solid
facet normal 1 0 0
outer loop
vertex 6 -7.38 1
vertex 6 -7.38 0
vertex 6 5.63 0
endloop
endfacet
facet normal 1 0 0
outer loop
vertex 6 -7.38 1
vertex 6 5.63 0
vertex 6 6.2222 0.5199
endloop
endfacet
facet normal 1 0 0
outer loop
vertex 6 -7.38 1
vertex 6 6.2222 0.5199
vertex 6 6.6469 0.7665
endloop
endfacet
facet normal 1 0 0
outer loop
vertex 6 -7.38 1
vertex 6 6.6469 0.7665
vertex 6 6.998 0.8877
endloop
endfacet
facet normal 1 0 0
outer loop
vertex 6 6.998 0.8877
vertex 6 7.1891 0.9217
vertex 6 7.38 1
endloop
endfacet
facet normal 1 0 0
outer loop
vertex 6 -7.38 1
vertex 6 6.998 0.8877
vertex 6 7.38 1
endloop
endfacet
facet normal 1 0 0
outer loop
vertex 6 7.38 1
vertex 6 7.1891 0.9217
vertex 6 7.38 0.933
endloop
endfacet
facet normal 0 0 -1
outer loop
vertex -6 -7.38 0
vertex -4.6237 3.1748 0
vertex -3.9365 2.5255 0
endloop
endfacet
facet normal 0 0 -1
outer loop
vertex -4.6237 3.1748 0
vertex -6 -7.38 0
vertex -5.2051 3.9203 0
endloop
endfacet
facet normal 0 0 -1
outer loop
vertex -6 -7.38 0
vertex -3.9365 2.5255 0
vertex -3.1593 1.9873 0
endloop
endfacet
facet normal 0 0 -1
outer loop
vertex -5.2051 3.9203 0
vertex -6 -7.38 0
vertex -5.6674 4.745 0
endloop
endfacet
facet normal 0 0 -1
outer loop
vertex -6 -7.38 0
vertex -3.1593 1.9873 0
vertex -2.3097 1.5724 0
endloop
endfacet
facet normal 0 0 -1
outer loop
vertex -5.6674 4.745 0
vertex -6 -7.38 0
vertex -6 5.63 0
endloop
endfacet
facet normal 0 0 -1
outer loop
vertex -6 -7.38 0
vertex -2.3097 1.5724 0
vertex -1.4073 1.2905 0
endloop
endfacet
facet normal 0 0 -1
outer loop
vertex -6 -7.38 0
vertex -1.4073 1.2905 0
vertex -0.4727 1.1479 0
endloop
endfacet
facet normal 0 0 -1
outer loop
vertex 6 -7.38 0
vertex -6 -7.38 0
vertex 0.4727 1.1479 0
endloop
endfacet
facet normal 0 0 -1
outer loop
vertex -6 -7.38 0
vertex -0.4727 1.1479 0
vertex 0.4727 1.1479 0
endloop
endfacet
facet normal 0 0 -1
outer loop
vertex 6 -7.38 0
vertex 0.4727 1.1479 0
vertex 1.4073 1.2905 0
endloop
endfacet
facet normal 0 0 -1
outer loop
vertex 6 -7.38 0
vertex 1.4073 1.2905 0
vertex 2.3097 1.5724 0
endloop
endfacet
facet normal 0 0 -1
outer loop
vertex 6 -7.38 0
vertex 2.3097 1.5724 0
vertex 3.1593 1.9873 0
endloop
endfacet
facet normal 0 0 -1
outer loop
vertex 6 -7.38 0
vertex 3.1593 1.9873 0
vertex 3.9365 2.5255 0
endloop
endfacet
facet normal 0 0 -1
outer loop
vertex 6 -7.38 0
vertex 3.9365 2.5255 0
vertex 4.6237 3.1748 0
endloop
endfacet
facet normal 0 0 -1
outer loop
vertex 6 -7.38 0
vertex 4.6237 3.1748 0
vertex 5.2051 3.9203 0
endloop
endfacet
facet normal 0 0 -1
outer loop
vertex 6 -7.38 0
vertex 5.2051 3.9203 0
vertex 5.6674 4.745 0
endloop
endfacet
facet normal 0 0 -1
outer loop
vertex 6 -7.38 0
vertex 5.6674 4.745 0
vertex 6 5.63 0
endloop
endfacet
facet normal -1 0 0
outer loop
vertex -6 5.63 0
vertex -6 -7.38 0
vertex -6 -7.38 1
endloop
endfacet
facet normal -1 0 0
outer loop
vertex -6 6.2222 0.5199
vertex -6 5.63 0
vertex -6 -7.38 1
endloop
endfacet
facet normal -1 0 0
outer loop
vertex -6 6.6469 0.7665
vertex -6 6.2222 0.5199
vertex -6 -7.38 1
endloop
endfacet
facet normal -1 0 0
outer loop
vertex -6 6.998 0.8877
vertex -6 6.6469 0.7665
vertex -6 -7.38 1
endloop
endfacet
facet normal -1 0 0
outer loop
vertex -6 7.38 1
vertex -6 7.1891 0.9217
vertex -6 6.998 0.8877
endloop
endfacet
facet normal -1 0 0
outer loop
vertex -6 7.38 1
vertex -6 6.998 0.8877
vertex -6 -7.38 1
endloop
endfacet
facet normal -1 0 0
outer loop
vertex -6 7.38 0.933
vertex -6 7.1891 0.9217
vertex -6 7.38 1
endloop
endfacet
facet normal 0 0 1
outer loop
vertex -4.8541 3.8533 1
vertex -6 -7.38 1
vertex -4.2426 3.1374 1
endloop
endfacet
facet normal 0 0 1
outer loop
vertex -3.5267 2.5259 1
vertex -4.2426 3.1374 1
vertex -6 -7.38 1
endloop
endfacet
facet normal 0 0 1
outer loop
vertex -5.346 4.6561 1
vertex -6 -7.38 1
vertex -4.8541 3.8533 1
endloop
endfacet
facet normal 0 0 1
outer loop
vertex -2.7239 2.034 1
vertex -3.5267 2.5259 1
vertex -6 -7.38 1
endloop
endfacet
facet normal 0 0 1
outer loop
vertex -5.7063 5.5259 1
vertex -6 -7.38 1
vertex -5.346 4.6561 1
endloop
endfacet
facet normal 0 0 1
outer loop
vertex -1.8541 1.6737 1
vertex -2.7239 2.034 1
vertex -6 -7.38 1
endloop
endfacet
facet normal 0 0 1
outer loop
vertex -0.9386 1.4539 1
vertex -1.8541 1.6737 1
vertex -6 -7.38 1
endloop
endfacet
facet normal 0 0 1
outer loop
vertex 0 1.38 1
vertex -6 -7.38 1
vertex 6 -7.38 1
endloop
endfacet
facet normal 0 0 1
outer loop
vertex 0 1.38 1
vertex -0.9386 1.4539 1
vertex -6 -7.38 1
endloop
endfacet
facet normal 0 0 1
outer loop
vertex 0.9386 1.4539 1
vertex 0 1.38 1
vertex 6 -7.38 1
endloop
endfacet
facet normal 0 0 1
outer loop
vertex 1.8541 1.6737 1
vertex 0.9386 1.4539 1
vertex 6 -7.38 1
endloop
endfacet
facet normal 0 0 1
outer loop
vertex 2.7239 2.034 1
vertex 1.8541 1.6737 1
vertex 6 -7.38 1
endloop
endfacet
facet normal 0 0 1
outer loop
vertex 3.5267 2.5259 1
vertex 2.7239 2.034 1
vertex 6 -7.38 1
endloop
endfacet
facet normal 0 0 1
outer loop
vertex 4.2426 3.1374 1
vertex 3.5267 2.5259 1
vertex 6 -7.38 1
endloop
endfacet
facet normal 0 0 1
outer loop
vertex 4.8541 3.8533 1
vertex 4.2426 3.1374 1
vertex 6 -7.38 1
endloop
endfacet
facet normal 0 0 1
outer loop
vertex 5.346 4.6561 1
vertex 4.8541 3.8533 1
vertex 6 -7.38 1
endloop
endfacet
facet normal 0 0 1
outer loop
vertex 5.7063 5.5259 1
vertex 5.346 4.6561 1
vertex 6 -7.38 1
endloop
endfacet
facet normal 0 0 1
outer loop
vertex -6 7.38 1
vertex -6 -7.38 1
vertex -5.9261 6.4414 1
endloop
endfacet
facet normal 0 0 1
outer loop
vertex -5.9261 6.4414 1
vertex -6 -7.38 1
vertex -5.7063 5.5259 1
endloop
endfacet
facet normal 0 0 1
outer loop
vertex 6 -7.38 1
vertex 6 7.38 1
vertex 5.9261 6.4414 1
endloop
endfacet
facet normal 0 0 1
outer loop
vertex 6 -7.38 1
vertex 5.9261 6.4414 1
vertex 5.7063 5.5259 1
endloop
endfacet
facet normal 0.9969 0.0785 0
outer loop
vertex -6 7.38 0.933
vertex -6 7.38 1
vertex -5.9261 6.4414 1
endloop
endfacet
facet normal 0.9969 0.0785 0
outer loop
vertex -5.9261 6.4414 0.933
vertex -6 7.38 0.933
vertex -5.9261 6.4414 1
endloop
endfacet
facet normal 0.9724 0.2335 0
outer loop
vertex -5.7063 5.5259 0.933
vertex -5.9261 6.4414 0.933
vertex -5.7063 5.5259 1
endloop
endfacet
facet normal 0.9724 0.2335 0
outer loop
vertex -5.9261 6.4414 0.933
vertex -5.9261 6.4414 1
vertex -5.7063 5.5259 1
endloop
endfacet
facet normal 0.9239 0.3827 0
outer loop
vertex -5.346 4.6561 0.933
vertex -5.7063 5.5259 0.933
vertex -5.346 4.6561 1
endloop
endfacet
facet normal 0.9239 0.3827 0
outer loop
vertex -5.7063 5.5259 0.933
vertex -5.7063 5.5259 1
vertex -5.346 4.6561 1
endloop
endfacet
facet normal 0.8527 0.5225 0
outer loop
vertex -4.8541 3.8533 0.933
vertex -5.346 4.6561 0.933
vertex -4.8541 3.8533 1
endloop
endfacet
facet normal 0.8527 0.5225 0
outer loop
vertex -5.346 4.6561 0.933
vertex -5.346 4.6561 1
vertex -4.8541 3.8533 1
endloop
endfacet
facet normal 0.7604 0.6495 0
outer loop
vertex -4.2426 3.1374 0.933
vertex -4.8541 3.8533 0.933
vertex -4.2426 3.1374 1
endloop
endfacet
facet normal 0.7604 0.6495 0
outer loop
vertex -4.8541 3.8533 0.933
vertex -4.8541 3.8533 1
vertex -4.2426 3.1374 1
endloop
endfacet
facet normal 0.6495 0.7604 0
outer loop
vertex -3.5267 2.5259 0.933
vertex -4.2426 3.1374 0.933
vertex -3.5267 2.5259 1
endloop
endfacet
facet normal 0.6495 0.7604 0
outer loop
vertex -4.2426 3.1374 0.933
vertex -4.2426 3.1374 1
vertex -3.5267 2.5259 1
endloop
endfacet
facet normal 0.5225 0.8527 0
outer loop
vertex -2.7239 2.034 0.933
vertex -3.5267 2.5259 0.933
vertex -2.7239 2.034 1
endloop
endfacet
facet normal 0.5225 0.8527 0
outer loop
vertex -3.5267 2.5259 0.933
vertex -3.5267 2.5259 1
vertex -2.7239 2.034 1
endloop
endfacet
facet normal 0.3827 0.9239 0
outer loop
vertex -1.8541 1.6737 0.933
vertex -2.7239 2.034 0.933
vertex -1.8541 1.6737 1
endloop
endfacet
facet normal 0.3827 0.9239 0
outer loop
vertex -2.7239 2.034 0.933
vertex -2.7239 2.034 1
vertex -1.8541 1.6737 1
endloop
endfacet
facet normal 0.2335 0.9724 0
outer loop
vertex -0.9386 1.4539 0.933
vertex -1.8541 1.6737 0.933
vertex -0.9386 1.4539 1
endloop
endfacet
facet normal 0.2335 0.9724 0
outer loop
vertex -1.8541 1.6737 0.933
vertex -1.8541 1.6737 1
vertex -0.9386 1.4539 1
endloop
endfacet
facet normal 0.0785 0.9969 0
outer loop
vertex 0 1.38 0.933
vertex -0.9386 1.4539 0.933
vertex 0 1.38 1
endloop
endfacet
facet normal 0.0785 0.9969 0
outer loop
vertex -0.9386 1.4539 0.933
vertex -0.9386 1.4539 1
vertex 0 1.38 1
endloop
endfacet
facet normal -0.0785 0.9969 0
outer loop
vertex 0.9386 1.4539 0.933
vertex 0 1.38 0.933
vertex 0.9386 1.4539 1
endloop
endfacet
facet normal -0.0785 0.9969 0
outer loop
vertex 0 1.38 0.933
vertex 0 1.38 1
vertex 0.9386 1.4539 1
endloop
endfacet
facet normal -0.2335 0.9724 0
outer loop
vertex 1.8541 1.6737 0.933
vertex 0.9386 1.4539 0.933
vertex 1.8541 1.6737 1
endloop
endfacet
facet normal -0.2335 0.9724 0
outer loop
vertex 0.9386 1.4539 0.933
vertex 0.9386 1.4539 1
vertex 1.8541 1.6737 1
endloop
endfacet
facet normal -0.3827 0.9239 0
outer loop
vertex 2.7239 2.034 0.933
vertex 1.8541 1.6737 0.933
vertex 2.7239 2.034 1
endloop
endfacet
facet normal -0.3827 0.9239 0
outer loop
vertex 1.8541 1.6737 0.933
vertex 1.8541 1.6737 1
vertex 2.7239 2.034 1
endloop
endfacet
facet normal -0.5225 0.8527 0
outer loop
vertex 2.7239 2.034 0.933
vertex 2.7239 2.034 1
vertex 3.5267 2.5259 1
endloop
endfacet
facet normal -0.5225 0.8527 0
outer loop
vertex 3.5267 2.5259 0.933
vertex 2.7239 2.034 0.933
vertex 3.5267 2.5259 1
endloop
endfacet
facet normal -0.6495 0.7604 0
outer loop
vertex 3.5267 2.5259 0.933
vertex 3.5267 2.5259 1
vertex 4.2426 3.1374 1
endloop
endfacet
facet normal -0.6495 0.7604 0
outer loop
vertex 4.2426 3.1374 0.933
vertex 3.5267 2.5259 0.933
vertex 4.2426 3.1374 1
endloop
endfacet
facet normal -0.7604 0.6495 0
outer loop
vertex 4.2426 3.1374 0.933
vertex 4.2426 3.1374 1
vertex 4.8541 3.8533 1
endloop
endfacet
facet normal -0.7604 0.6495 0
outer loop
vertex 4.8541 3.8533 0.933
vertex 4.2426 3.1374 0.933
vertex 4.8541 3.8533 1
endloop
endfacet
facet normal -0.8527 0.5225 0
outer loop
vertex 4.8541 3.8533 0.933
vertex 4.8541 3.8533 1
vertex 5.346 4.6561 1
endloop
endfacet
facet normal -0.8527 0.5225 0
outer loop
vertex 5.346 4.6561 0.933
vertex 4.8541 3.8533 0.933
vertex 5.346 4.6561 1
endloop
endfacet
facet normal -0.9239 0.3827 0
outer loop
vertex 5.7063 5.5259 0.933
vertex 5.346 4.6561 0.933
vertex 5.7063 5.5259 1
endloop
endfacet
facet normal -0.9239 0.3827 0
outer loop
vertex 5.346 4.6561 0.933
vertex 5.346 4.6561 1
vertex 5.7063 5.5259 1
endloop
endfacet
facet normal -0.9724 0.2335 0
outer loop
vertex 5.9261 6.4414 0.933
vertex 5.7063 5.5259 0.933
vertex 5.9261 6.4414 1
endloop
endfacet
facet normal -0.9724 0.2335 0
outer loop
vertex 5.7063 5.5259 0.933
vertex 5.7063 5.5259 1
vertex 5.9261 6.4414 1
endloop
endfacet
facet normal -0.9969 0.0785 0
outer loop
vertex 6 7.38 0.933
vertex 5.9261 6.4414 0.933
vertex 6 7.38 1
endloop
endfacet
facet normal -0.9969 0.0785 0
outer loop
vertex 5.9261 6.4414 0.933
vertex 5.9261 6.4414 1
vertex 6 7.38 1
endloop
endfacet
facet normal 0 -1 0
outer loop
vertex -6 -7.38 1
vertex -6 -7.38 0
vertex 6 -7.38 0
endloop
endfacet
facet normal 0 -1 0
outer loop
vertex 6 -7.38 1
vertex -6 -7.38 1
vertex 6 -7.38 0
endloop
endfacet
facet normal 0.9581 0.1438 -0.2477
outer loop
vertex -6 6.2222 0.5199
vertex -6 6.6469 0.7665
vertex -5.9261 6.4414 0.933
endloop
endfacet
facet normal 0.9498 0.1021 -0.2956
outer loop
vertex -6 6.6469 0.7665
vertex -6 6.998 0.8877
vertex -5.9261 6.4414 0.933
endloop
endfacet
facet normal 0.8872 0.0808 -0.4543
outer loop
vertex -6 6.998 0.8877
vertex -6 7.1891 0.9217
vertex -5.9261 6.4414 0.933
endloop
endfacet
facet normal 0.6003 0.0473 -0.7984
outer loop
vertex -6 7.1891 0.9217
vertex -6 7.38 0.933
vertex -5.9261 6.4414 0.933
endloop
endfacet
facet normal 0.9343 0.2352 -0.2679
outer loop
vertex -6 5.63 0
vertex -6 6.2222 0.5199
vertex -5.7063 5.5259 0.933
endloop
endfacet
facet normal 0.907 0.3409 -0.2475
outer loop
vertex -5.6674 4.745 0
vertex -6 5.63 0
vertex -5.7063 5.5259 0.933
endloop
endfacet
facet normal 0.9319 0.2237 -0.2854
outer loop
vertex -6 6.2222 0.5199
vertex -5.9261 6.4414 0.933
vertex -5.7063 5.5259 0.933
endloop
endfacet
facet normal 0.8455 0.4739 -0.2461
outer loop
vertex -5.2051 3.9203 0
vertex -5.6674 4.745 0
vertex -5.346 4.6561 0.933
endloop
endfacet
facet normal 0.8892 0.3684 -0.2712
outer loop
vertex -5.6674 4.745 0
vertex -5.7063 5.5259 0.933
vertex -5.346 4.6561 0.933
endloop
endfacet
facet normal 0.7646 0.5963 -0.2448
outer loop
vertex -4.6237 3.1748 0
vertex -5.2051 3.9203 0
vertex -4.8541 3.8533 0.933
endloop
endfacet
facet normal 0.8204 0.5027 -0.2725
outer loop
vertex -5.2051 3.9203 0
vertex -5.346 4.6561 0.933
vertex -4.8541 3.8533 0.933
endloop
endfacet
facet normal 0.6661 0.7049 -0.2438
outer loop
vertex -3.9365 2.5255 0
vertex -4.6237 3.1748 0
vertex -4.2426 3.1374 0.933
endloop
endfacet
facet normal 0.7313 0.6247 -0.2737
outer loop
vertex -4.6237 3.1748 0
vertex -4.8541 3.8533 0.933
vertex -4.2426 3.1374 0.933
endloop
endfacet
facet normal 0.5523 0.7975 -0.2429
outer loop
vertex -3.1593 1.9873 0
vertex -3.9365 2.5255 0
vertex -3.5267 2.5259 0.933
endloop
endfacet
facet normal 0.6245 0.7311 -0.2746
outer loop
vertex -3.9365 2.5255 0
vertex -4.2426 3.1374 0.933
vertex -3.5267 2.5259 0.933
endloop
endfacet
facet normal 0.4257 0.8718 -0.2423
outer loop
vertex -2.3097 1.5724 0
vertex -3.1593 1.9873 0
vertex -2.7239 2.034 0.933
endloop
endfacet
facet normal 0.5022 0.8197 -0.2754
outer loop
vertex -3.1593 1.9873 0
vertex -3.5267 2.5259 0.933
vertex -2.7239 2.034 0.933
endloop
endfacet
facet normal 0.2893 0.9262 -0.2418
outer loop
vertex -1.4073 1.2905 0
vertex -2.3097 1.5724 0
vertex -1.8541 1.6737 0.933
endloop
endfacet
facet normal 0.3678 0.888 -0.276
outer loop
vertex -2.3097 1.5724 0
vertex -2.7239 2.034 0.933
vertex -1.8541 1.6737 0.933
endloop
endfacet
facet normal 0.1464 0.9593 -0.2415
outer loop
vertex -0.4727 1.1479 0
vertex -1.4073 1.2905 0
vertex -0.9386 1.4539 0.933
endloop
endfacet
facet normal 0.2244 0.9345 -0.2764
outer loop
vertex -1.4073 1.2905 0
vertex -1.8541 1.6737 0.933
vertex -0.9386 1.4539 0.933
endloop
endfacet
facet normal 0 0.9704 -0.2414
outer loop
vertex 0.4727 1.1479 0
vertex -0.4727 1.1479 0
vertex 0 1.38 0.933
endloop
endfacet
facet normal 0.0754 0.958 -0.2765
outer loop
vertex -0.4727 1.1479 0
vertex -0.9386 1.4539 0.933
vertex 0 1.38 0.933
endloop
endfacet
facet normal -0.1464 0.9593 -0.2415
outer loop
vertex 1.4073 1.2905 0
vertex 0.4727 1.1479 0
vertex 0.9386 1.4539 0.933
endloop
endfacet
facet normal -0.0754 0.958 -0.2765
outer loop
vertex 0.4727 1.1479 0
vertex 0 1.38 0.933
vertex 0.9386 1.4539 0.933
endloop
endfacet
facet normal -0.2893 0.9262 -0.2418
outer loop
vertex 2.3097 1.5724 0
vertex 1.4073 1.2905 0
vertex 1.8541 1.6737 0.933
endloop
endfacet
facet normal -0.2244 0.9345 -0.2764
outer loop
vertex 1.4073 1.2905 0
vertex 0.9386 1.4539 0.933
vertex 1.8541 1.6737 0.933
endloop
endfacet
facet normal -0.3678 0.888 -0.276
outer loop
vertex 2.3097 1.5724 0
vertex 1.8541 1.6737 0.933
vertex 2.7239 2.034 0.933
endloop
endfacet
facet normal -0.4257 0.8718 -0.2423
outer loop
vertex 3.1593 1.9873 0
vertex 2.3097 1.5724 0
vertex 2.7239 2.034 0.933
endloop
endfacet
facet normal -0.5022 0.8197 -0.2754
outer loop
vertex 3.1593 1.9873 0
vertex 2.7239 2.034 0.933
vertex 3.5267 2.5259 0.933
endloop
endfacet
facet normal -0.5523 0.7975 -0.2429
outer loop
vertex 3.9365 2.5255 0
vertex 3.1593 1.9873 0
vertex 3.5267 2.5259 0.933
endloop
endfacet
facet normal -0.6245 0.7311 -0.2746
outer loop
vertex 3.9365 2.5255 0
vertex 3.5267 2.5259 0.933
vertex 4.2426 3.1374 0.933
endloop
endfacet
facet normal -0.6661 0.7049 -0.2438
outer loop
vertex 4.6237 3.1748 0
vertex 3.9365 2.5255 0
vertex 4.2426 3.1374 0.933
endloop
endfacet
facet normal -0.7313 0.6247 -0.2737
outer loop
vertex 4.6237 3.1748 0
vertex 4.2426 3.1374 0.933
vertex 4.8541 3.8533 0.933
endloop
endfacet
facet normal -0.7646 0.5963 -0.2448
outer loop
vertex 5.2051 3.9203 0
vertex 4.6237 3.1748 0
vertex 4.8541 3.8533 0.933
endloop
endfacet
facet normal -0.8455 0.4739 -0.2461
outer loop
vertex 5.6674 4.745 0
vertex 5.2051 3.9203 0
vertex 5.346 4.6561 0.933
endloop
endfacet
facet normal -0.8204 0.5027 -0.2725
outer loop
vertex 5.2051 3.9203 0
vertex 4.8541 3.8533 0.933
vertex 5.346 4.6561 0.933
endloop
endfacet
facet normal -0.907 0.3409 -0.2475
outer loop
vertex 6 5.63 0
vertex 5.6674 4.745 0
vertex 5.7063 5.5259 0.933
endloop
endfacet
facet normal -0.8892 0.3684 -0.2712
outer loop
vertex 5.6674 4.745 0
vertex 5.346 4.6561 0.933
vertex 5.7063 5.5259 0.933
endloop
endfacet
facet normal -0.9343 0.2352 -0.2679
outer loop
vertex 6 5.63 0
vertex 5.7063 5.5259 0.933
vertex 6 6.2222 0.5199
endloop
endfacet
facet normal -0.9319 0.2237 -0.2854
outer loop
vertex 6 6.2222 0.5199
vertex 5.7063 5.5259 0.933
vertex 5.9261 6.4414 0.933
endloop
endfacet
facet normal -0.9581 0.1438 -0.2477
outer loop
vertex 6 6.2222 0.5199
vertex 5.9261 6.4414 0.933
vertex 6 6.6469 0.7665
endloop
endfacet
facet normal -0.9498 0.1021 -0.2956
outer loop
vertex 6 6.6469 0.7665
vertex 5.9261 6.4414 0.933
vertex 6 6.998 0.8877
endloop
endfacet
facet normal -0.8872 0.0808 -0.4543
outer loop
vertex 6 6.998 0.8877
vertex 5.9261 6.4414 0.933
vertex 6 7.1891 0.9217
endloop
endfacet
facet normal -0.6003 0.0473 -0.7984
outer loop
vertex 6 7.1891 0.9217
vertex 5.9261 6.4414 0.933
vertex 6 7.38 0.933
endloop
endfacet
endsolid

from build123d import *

# Parameters (mm, degrees)
F0_W          = 12
F0_H          = 14.76
F1_DEPTH      = 1
F3_DEPTH      = 25.4
F3_DEPTH_BACK = 25.4
F4_SIZE2      = 0.9330127019
F4_SIZE       = 0.25


with BuildPart() as f1:
    # F0 (on Top) → F1 (new body)
    with BuildSketch(Plane.XY):
        Rectangle(F0_W, F0_H)
    extrude(amount=F1_DEPTH)

    # F2 (on face) → F3 (cut, two sides)
    with BuildSketch(Plane.XY.offset(1)) as f3_sk:
        with BuildLine():
            ThreePointArc((-6, 7.38), (0, 1.38), (6, 7.38))
            Line((6, 7.38), (-6, 7.38))
        make_face()
    extrude(amount=-F3_DEPTH, mode=Mode.SUBTRACT)
    extrude(f3_sk.sketch, amount=F3_DEPTH_BACK, mode=Mode.SUBTRACT)

    # F4
    f4_edges = [f1.edges().sort_by_distance(p)[0] for p in [
        (0, 1.38, 0),
    ]]
    f4_side = f1.faces().sort_by_distance((0, -2.26695, 0))[0]
    chamfer(f4_edges, length=F4_SIZE, length2=F4_SIZE2, reference=f4_side)


solid = f1.part
